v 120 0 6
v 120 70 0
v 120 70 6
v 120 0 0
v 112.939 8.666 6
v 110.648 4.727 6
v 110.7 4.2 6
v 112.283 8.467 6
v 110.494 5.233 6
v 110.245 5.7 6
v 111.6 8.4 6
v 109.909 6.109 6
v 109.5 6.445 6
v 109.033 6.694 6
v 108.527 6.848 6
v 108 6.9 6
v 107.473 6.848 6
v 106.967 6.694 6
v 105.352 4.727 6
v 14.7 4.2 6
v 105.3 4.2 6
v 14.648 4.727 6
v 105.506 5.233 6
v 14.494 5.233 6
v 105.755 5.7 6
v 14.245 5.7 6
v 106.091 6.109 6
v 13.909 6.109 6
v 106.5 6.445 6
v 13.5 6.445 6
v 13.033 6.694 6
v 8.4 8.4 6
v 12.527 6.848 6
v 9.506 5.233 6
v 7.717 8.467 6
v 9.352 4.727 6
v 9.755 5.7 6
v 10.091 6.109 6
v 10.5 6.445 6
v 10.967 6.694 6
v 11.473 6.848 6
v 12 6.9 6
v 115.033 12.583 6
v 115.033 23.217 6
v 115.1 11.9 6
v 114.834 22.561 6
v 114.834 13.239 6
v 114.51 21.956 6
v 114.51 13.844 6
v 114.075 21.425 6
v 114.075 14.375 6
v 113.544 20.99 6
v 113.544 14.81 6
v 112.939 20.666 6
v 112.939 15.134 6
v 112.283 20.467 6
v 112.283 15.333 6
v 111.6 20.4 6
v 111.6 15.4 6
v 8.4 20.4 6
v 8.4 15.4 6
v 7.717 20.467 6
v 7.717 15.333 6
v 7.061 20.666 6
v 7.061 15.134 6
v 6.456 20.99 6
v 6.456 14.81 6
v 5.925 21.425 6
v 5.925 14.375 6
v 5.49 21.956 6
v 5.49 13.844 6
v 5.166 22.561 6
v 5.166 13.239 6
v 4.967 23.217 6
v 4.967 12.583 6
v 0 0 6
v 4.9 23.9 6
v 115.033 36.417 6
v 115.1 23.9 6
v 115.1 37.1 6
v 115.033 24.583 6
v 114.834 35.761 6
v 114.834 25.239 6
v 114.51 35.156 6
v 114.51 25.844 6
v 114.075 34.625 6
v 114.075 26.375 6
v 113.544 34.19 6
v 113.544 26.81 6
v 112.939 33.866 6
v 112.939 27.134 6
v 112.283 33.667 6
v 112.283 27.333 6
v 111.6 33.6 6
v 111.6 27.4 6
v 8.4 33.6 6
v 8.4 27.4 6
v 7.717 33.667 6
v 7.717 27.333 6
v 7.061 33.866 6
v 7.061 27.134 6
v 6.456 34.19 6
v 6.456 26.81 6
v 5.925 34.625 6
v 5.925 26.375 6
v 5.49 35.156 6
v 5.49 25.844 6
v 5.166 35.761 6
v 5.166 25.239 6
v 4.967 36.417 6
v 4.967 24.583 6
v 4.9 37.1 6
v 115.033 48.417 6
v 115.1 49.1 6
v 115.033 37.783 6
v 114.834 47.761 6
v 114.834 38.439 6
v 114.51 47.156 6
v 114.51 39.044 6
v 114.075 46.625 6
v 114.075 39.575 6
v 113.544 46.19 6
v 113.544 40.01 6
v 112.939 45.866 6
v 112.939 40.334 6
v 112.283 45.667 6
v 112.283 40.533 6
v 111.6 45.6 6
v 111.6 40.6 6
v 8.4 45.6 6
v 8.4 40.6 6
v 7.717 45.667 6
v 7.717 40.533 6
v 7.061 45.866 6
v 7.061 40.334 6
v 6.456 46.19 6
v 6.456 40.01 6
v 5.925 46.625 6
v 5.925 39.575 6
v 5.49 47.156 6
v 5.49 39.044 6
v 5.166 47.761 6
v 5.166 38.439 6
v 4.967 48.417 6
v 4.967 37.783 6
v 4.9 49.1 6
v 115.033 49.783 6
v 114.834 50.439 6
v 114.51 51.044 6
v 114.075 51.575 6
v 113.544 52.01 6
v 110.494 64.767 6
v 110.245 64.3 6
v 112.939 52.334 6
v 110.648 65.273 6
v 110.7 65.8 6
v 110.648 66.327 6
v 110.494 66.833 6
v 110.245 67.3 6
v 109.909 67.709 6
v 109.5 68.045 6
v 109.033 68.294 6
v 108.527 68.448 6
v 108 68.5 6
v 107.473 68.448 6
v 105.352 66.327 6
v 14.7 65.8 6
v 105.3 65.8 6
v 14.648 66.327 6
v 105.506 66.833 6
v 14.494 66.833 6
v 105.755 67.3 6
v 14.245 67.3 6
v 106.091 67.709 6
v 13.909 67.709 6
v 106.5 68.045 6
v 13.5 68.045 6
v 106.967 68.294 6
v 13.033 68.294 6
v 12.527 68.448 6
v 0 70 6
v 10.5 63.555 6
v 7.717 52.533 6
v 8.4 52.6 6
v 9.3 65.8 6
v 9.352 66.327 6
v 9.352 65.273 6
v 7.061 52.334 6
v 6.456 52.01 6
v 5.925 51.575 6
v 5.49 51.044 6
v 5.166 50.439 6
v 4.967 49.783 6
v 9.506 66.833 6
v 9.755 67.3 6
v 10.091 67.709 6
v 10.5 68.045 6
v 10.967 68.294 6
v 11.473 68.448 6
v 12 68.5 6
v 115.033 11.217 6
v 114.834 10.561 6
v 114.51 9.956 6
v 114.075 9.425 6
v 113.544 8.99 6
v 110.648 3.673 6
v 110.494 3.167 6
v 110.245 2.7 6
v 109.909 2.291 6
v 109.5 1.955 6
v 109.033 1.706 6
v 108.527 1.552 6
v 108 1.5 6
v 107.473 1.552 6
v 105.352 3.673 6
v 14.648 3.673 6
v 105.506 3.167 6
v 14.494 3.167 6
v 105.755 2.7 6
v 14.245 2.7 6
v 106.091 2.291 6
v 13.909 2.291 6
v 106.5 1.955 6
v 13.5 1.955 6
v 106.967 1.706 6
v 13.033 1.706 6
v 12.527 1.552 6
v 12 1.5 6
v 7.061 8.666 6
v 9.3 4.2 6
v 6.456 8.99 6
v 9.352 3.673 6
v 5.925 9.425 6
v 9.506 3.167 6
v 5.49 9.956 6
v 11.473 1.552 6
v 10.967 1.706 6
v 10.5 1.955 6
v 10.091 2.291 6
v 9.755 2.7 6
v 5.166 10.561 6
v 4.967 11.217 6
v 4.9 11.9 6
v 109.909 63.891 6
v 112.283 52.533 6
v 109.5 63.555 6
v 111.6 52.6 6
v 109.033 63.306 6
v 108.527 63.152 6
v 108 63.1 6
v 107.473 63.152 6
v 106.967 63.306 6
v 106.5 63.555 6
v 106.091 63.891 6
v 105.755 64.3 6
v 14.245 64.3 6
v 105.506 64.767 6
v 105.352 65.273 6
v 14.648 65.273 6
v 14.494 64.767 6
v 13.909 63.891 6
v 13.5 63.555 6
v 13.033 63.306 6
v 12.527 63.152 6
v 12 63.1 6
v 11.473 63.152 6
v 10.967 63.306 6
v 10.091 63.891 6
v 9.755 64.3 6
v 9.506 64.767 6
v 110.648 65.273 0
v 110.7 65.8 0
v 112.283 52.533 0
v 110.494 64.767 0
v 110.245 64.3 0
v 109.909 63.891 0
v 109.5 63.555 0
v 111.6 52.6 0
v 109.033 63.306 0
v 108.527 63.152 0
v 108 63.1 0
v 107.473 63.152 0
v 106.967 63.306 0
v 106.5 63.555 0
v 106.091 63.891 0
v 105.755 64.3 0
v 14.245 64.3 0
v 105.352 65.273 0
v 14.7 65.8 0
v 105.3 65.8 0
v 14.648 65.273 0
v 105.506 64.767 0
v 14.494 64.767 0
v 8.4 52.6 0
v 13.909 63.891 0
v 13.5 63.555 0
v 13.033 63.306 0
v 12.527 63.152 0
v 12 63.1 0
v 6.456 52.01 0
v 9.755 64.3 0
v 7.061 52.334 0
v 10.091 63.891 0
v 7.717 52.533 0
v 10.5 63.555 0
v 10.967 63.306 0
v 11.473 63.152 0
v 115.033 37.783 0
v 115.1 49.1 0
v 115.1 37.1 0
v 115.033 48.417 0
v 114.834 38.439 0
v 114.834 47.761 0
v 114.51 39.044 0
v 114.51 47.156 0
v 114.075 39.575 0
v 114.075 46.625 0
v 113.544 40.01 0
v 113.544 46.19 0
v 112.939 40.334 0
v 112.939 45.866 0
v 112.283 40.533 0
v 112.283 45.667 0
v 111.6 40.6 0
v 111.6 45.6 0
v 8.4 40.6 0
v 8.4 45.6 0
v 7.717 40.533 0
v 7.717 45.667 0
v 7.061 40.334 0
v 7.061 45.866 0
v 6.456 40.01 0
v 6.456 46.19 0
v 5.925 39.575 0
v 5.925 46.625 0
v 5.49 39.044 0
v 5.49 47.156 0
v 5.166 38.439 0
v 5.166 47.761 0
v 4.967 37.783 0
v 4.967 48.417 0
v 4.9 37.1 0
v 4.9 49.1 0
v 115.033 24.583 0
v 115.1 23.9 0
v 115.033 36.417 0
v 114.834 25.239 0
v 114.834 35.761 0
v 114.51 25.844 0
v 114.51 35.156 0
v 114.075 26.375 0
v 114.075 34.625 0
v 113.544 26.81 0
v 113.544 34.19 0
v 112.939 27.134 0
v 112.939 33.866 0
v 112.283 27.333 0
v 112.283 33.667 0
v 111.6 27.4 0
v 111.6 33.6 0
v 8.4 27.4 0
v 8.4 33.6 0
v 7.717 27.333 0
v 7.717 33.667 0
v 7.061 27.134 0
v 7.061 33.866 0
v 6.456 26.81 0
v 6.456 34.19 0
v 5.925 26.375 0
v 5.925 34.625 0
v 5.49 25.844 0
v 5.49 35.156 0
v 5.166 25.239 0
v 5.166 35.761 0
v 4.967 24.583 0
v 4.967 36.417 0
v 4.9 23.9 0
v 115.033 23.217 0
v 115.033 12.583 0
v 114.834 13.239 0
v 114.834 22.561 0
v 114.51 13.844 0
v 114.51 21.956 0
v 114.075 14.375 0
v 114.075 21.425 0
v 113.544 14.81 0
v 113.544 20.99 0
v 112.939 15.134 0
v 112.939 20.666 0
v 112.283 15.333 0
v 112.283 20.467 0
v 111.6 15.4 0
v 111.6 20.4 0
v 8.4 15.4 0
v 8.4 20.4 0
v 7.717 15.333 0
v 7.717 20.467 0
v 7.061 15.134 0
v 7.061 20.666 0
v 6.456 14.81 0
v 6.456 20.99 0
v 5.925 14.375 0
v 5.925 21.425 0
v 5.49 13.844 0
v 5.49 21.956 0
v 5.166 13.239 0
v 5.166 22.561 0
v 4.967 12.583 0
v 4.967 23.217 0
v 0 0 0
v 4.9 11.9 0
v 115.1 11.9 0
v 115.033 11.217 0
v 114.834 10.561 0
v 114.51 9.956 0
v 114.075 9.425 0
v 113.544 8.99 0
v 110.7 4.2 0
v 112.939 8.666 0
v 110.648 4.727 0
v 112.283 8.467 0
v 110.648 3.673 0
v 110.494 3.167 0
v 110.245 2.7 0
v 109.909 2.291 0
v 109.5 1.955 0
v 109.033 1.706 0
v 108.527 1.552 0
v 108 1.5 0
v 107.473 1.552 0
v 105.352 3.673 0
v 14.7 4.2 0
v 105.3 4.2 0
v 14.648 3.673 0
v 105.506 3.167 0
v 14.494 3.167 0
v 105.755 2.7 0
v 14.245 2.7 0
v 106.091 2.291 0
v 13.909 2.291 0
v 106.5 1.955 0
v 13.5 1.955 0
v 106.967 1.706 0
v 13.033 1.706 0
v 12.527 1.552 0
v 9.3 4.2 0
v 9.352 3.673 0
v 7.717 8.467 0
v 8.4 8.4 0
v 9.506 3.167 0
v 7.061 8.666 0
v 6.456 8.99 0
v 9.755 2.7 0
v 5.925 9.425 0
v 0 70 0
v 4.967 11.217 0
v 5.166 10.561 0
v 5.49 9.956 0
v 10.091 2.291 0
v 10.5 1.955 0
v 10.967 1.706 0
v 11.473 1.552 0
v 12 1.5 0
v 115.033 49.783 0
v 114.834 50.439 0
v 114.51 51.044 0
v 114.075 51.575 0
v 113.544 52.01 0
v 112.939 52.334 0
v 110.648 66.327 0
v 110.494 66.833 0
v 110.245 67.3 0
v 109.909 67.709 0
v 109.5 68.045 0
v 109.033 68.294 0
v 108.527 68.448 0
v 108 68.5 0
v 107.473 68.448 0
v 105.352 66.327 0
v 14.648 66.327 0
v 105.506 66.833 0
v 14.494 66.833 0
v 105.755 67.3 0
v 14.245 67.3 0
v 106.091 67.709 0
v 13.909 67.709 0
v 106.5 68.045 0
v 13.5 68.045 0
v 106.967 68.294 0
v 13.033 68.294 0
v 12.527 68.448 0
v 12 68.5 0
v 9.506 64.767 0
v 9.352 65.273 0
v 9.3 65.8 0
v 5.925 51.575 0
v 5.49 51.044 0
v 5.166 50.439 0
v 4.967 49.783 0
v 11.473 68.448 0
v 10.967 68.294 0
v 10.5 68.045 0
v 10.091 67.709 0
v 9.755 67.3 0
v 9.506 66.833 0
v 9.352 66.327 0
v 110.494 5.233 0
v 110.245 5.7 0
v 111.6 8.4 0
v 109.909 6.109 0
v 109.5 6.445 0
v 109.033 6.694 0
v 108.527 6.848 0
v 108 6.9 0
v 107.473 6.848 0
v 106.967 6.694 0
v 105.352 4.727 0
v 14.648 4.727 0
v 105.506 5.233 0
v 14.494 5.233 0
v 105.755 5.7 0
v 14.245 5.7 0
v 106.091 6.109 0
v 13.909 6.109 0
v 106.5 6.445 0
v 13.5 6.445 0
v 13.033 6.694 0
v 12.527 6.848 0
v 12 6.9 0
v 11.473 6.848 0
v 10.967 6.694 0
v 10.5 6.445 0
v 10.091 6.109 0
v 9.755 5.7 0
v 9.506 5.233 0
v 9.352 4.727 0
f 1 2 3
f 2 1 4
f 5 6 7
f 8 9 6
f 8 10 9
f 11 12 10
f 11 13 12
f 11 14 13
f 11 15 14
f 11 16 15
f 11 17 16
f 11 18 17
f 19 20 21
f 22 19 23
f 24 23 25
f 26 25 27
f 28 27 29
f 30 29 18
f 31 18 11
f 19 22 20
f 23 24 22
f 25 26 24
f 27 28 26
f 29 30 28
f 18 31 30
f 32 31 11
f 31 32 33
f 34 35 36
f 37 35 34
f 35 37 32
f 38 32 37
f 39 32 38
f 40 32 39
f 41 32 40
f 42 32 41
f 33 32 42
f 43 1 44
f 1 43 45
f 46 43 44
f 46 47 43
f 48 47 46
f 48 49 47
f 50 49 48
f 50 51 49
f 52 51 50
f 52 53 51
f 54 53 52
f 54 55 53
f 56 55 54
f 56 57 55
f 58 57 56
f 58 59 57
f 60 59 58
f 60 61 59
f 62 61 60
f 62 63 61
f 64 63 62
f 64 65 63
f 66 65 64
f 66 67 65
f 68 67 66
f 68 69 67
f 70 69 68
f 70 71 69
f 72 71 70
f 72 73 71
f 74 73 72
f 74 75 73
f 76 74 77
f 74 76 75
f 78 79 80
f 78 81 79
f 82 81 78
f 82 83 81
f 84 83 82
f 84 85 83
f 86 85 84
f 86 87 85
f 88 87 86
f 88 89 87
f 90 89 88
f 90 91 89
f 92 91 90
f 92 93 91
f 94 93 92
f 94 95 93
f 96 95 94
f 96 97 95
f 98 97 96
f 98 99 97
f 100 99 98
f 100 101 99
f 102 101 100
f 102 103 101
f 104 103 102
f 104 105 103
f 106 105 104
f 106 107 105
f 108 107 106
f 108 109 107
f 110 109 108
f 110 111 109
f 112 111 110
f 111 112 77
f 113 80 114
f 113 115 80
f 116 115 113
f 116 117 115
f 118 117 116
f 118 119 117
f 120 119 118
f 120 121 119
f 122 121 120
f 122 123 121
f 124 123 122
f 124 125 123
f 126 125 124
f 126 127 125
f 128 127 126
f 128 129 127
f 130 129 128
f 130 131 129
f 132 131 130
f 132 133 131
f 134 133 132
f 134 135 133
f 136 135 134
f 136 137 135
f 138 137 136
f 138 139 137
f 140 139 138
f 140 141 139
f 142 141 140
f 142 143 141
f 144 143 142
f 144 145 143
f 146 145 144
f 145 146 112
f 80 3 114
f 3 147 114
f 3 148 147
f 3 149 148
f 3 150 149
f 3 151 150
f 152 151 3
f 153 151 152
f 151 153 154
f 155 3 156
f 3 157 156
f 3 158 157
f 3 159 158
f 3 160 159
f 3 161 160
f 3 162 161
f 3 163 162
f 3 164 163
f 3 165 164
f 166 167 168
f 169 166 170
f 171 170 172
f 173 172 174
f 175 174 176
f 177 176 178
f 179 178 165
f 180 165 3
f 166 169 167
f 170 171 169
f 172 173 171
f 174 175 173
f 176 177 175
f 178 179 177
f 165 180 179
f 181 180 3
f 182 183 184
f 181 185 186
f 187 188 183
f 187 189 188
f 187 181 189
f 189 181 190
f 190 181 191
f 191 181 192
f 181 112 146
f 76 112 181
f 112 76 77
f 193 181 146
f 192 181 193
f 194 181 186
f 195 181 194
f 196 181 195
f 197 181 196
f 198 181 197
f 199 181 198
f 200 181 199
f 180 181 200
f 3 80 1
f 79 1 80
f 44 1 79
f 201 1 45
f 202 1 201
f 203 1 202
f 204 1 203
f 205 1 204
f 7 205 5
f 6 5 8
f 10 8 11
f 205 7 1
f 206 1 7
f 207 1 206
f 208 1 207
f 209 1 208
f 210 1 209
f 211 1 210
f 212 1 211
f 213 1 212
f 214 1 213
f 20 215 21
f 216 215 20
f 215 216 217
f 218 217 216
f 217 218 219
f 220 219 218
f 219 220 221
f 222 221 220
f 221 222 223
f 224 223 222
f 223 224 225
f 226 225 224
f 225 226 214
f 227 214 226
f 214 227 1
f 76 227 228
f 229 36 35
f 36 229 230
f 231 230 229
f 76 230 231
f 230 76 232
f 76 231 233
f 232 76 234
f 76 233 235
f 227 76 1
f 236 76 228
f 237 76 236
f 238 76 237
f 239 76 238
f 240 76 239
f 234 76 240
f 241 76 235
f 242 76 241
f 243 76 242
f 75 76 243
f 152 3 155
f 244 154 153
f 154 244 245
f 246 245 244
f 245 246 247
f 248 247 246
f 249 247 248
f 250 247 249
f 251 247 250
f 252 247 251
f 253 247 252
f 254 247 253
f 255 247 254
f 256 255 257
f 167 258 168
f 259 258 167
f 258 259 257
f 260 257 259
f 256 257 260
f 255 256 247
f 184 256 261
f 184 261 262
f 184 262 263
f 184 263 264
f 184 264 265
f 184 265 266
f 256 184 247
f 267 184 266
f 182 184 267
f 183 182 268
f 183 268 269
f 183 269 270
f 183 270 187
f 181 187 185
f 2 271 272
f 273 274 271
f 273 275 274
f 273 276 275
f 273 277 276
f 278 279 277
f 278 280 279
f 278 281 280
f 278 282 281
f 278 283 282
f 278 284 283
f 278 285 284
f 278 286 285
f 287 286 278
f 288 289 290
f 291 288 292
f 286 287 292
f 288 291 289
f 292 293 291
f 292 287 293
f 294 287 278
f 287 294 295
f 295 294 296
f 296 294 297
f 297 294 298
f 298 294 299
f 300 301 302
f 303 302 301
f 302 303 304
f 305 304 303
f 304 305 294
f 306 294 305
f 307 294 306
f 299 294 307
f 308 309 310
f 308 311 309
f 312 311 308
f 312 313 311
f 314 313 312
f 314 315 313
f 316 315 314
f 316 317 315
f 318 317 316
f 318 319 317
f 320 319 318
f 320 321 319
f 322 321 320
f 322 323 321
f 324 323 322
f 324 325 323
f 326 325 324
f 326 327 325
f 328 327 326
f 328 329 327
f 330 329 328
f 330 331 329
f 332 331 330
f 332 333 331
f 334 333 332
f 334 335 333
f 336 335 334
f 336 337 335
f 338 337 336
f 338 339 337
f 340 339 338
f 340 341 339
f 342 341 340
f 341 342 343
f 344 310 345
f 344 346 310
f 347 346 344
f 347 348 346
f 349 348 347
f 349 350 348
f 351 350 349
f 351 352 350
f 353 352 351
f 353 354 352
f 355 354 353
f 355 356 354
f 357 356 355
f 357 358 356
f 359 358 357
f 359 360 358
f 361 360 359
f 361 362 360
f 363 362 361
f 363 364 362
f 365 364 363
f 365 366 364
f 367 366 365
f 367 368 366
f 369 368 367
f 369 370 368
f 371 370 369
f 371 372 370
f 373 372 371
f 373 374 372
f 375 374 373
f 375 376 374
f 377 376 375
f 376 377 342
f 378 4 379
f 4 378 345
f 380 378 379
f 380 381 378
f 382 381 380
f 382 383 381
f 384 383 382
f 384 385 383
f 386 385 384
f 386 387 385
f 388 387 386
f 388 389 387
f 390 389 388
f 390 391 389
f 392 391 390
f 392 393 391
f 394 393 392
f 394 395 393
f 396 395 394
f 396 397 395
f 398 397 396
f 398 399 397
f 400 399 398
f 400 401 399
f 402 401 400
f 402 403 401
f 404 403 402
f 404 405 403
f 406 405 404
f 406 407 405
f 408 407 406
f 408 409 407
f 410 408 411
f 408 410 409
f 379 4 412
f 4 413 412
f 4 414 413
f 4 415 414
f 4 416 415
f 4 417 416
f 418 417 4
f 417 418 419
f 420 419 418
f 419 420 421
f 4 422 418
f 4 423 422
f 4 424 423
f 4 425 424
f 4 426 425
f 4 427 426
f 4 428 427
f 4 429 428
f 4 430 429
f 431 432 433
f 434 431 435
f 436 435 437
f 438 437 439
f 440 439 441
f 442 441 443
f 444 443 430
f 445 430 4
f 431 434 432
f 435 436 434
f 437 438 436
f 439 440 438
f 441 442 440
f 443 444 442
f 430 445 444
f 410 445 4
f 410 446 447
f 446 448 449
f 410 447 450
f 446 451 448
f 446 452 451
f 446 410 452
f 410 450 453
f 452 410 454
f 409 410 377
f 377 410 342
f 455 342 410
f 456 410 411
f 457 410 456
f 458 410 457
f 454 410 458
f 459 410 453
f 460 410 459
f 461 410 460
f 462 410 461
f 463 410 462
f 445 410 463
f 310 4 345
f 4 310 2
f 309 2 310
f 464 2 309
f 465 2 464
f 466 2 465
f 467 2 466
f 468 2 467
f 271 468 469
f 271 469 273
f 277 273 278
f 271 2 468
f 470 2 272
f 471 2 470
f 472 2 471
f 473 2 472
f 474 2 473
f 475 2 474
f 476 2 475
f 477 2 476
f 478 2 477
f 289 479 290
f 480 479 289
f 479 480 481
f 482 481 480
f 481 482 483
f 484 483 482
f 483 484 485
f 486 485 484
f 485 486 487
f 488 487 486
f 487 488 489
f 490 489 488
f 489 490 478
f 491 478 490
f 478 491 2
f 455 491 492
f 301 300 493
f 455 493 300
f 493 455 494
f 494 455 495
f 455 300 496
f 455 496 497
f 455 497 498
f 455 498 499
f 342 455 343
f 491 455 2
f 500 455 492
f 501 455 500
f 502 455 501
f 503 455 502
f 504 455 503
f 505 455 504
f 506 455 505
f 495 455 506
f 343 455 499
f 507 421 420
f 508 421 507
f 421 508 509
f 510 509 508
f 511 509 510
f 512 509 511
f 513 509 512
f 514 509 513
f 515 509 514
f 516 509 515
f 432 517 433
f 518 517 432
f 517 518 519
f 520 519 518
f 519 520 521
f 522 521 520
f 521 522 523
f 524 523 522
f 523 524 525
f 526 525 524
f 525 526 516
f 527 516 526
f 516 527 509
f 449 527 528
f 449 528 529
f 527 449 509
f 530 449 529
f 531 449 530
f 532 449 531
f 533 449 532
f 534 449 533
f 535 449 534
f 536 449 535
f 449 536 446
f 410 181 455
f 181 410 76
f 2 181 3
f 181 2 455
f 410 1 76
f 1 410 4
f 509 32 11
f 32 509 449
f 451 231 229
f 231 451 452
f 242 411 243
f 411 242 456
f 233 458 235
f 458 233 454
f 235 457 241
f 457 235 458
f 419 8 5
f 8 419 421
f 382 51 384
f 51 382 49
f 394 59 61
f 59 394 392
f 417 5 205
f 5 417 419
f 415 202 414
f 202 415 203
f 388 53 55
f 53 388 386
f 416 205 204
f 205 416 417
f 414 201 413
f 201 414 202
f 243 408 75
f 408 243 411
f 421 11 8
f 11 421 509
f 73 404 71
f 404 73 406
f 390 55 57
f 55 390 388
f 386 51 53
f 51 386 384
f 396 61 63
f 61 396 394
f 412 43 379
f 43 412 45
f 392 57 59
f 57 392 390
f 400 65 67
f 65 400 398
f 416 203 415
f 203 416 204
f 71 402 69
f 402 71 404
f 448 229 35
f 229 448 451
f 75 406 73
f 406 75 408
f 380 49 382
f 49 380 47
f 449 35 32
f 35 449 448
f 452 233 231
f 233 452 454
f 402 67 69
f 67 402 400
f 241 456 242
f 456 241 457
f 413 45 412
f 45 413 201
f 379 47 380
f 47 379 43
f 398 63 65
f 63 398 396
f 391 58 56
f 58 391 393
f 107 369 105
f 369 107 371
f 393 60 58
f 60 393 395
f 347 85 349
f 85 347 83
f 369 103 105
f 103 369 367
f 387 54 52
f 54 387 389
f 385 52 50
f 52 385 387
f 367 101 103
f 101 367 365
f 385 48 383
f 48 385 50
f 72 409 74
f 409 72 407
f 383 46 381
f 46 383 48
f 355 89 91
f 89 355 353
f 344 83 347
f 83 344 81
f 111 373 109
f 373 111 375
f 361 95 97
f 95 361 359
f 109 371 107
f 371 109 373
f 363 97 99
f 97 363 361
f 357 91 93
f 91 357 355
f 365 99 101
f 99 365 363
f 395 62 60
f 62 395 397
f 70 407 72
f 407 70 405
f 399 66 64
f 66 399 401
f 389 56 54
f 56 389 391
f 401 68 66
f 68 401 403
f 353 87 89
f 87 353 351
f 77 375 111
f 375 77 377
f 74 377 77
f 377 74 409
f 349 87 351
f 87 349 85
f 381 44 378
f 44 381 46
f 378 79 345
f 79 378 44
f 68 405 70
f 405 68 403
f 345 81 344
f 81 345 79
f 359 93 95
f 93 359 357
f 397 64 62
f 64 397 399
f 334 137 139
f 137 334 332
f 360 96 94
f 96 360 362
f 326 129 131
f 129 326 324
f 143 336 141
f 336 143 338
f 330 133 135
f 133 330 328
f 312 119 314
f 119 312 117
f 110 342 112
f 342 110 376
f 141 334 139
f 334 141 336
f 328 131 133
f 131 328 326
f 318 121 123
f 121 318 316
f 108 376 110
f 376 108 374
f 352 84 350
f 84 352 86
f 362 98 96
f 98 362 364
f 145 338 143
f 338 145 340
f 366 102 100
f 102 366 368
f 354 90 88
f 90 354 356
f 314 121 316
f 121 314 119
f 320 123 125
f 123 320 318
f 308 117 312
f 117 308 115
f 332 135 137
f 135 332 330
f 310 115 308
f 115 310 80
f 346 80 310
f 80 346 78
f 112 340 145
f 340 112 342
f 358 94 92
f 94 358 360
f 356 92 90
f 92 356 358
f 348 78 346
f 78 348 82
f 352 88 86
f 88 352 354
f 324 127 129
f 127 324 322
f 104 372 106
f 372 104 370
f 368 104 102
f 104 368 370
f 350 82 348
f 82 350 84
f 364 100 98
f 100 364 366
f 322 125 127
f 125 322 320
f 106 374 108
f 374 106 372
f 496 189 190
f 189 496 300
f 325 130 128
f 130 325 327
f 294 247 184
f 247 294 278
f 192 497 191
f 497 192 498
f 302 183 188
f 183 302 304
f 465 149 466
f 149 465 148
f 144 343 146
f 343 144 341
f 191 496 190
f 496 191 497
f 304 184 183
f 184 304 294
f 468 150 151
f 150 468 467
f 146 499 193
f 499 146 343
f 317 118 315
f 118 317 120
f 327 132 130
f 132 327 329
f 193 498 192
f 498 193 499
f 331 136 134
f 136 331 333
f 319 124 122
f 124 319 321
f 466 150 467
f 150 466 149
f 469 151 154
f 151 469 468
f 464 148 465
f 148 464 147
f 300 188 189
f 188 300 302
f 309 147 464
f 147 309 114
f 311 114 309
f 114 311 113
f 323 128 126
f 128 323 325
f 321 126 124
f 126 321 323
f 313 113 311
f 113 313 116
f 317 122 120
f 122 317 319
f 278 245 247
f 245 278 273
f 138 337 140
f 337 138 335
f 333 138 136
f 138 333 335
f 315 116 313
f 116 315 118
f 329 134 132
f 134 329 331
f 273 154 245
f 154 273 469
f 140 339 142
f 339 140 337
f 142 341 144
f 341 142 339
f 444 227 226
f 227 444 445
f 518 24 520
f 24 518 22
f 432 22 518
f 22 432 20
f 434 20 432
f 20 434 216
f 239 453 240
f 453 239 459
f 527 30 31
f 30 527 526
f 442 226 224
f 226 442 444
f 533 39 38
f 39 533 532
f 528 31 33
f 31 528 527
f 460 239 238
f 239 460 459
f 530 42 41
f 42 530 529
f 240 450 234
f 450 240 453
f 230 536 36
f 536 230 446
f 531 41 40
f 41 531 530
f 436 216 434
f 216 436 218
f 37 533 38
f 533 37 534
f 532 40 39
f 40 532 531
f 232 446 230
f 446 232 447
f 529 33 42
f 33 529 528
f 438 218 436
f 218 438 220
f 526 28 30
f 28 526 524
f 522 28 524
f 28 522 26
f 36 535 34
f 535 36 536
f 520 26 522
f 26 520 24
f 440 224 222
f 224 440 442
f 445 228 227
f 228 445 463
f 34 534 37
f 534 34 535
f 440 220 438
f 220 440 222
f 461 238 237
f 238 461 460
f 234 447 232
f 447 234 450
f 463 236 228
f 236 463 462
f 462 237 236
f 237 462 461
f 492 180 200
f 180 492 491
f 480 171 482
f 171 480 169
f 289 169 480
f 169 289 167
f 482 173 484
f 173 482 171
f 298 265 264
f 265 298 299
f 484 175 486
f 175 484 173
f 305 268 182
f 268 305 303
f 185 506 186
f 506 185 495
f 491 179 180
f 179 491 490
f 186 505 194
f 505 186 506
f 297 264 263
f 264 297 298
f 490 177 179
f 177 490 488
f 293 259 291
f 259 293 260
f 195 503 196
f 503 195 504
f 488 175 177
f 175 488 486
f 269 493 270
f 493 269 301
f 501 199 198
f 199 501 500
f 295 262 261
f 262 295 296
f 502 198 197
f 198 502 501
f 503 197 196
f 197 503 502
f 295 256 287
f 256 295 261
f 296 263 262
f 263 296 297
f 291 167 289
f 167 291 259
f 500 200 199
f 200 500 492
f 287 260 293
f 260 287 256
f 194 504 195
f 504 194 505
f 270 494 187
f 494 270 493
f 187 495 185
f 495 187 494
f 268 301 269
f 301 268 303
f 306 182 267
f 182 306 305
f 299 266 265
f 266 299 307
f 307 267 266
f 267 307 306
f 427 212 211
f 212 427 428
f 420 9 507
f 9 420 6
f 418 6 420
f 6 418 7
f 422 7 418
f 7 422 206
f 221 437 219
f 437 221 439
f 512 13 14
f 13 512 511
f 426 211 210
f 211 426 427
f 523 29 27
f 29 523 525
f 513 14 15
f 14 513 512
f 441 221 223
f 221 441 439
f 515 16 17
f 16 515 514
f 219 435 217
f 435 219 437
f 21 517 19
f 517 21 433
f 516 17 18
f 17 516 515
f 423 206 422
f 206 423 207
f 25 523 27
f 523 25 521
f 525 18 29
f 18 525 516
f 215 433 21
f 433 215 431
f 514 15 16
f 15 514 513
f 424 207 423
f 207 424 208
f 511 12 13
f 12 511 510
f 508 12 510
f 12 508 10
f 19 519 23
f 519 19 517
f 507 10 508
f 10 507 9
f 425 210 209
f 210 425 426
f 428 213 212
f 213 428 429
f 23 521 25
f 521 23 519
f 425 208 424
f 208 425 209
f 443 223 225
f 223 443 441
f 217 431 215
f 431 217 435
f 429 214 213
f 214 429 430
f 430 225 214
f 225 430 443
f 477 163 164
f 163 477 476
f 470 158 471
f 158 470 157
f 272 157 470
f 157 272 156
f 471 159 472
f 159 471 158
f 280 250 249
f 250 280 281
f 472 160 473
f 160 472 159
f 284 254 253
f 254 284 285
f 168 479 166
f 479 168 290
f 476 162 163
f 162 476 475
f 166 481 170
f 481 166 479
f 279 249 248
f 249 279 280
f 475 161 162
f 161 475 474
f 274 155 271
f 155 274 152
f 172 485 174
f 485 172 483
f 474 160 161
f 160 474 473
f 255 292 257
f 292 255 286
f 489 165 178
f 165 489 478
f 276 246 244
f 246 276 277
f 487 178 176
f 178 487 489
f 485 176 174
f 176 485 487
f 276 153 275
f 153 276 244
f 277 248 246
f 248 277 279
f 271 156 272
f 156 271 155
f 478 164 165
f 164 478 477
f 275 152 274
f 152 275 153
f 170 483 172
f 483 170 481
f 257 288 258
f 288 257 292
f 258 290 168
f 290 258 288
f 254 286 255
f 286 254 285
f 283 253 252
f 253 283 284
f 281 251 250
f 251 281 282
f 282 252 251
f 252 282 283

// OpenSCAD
$fn = 32;

// ----------------------------------------------------------------------
// Slotted panel: 120 x 70 mm, 4 ряда of slots
// ----------------------------------------------------------------------

// --- parameters (mm) ---
panel_w = 120;            // panel width
panel_d = 70;             // panel depth
thick = 6;                // panel thickness
slot_w = 7;               // slot width
pitch0 = 12;              // first row pitch
pitch_step = 1.2;         // pitch increase per row
margin = 8.4;             // margin around the slot field
rows = 4;                 // number of slot rows
mount_d = 5.4;            // mounting holes
mount_x = 48;             // mounting hole offset

difference() {
  union() {
    cube([panel_w, panel_d, thick]);
  }
  /* slot rows: stadium shaped cutters, 2.5 mm clear of both faces */
  /* row 0: pitch 12, length 103.2 */
  hull() {
    translate([8.4, 11.9, -2.5]) cylinder(h = thick + 5, d = slot_w);
    translate([111.6, 11.9, -2.5]) cylinder(h = thick + 5, d = slot_w);
  }
  /* row 1: pitch 13.2, length 103.2 */
  hull() {
    translate([8.4, 23.9, -2.5]) cylinder(h = thick + 5, d = slot_w);
    translate([111.6, 23.9, -2.5]) cylinder(h = thick + 5, d = slot_w);
  }
  /* row 2: pitch 12, length 103.2 */
  hull() {
    translate([8.4, 37.1, -2.5]) cylinder(h = thick + 5, d = slot_w);
    translate([111.6, 37.1, -2.5]) cylinder(h = thick + 5, d = slot_w);
  }
  /* row 3: pitch 13.2, length 103.2 */
  hull() {
    translate([8.4, 49.1, -2.5]) cylinder(h = thick + 5, d = slot_w);
    translate([111.6, 49.1, -2.5]) cylinder(h = thick + 5, d = slot_w);
  }
  translate([12, 4.2, -2.5]) cylinder(h = 11, d = mount_d);
  translate([12, 65.8, -2.5]) cylinder(h = 11, d = mount_d);
  translate([108, 4.2, -2.5]) cylinder(h = 11, d = mount_d);
  translate([108, 65.8, -2.5]) cylinder(h = 11, d = mount_d);
}
